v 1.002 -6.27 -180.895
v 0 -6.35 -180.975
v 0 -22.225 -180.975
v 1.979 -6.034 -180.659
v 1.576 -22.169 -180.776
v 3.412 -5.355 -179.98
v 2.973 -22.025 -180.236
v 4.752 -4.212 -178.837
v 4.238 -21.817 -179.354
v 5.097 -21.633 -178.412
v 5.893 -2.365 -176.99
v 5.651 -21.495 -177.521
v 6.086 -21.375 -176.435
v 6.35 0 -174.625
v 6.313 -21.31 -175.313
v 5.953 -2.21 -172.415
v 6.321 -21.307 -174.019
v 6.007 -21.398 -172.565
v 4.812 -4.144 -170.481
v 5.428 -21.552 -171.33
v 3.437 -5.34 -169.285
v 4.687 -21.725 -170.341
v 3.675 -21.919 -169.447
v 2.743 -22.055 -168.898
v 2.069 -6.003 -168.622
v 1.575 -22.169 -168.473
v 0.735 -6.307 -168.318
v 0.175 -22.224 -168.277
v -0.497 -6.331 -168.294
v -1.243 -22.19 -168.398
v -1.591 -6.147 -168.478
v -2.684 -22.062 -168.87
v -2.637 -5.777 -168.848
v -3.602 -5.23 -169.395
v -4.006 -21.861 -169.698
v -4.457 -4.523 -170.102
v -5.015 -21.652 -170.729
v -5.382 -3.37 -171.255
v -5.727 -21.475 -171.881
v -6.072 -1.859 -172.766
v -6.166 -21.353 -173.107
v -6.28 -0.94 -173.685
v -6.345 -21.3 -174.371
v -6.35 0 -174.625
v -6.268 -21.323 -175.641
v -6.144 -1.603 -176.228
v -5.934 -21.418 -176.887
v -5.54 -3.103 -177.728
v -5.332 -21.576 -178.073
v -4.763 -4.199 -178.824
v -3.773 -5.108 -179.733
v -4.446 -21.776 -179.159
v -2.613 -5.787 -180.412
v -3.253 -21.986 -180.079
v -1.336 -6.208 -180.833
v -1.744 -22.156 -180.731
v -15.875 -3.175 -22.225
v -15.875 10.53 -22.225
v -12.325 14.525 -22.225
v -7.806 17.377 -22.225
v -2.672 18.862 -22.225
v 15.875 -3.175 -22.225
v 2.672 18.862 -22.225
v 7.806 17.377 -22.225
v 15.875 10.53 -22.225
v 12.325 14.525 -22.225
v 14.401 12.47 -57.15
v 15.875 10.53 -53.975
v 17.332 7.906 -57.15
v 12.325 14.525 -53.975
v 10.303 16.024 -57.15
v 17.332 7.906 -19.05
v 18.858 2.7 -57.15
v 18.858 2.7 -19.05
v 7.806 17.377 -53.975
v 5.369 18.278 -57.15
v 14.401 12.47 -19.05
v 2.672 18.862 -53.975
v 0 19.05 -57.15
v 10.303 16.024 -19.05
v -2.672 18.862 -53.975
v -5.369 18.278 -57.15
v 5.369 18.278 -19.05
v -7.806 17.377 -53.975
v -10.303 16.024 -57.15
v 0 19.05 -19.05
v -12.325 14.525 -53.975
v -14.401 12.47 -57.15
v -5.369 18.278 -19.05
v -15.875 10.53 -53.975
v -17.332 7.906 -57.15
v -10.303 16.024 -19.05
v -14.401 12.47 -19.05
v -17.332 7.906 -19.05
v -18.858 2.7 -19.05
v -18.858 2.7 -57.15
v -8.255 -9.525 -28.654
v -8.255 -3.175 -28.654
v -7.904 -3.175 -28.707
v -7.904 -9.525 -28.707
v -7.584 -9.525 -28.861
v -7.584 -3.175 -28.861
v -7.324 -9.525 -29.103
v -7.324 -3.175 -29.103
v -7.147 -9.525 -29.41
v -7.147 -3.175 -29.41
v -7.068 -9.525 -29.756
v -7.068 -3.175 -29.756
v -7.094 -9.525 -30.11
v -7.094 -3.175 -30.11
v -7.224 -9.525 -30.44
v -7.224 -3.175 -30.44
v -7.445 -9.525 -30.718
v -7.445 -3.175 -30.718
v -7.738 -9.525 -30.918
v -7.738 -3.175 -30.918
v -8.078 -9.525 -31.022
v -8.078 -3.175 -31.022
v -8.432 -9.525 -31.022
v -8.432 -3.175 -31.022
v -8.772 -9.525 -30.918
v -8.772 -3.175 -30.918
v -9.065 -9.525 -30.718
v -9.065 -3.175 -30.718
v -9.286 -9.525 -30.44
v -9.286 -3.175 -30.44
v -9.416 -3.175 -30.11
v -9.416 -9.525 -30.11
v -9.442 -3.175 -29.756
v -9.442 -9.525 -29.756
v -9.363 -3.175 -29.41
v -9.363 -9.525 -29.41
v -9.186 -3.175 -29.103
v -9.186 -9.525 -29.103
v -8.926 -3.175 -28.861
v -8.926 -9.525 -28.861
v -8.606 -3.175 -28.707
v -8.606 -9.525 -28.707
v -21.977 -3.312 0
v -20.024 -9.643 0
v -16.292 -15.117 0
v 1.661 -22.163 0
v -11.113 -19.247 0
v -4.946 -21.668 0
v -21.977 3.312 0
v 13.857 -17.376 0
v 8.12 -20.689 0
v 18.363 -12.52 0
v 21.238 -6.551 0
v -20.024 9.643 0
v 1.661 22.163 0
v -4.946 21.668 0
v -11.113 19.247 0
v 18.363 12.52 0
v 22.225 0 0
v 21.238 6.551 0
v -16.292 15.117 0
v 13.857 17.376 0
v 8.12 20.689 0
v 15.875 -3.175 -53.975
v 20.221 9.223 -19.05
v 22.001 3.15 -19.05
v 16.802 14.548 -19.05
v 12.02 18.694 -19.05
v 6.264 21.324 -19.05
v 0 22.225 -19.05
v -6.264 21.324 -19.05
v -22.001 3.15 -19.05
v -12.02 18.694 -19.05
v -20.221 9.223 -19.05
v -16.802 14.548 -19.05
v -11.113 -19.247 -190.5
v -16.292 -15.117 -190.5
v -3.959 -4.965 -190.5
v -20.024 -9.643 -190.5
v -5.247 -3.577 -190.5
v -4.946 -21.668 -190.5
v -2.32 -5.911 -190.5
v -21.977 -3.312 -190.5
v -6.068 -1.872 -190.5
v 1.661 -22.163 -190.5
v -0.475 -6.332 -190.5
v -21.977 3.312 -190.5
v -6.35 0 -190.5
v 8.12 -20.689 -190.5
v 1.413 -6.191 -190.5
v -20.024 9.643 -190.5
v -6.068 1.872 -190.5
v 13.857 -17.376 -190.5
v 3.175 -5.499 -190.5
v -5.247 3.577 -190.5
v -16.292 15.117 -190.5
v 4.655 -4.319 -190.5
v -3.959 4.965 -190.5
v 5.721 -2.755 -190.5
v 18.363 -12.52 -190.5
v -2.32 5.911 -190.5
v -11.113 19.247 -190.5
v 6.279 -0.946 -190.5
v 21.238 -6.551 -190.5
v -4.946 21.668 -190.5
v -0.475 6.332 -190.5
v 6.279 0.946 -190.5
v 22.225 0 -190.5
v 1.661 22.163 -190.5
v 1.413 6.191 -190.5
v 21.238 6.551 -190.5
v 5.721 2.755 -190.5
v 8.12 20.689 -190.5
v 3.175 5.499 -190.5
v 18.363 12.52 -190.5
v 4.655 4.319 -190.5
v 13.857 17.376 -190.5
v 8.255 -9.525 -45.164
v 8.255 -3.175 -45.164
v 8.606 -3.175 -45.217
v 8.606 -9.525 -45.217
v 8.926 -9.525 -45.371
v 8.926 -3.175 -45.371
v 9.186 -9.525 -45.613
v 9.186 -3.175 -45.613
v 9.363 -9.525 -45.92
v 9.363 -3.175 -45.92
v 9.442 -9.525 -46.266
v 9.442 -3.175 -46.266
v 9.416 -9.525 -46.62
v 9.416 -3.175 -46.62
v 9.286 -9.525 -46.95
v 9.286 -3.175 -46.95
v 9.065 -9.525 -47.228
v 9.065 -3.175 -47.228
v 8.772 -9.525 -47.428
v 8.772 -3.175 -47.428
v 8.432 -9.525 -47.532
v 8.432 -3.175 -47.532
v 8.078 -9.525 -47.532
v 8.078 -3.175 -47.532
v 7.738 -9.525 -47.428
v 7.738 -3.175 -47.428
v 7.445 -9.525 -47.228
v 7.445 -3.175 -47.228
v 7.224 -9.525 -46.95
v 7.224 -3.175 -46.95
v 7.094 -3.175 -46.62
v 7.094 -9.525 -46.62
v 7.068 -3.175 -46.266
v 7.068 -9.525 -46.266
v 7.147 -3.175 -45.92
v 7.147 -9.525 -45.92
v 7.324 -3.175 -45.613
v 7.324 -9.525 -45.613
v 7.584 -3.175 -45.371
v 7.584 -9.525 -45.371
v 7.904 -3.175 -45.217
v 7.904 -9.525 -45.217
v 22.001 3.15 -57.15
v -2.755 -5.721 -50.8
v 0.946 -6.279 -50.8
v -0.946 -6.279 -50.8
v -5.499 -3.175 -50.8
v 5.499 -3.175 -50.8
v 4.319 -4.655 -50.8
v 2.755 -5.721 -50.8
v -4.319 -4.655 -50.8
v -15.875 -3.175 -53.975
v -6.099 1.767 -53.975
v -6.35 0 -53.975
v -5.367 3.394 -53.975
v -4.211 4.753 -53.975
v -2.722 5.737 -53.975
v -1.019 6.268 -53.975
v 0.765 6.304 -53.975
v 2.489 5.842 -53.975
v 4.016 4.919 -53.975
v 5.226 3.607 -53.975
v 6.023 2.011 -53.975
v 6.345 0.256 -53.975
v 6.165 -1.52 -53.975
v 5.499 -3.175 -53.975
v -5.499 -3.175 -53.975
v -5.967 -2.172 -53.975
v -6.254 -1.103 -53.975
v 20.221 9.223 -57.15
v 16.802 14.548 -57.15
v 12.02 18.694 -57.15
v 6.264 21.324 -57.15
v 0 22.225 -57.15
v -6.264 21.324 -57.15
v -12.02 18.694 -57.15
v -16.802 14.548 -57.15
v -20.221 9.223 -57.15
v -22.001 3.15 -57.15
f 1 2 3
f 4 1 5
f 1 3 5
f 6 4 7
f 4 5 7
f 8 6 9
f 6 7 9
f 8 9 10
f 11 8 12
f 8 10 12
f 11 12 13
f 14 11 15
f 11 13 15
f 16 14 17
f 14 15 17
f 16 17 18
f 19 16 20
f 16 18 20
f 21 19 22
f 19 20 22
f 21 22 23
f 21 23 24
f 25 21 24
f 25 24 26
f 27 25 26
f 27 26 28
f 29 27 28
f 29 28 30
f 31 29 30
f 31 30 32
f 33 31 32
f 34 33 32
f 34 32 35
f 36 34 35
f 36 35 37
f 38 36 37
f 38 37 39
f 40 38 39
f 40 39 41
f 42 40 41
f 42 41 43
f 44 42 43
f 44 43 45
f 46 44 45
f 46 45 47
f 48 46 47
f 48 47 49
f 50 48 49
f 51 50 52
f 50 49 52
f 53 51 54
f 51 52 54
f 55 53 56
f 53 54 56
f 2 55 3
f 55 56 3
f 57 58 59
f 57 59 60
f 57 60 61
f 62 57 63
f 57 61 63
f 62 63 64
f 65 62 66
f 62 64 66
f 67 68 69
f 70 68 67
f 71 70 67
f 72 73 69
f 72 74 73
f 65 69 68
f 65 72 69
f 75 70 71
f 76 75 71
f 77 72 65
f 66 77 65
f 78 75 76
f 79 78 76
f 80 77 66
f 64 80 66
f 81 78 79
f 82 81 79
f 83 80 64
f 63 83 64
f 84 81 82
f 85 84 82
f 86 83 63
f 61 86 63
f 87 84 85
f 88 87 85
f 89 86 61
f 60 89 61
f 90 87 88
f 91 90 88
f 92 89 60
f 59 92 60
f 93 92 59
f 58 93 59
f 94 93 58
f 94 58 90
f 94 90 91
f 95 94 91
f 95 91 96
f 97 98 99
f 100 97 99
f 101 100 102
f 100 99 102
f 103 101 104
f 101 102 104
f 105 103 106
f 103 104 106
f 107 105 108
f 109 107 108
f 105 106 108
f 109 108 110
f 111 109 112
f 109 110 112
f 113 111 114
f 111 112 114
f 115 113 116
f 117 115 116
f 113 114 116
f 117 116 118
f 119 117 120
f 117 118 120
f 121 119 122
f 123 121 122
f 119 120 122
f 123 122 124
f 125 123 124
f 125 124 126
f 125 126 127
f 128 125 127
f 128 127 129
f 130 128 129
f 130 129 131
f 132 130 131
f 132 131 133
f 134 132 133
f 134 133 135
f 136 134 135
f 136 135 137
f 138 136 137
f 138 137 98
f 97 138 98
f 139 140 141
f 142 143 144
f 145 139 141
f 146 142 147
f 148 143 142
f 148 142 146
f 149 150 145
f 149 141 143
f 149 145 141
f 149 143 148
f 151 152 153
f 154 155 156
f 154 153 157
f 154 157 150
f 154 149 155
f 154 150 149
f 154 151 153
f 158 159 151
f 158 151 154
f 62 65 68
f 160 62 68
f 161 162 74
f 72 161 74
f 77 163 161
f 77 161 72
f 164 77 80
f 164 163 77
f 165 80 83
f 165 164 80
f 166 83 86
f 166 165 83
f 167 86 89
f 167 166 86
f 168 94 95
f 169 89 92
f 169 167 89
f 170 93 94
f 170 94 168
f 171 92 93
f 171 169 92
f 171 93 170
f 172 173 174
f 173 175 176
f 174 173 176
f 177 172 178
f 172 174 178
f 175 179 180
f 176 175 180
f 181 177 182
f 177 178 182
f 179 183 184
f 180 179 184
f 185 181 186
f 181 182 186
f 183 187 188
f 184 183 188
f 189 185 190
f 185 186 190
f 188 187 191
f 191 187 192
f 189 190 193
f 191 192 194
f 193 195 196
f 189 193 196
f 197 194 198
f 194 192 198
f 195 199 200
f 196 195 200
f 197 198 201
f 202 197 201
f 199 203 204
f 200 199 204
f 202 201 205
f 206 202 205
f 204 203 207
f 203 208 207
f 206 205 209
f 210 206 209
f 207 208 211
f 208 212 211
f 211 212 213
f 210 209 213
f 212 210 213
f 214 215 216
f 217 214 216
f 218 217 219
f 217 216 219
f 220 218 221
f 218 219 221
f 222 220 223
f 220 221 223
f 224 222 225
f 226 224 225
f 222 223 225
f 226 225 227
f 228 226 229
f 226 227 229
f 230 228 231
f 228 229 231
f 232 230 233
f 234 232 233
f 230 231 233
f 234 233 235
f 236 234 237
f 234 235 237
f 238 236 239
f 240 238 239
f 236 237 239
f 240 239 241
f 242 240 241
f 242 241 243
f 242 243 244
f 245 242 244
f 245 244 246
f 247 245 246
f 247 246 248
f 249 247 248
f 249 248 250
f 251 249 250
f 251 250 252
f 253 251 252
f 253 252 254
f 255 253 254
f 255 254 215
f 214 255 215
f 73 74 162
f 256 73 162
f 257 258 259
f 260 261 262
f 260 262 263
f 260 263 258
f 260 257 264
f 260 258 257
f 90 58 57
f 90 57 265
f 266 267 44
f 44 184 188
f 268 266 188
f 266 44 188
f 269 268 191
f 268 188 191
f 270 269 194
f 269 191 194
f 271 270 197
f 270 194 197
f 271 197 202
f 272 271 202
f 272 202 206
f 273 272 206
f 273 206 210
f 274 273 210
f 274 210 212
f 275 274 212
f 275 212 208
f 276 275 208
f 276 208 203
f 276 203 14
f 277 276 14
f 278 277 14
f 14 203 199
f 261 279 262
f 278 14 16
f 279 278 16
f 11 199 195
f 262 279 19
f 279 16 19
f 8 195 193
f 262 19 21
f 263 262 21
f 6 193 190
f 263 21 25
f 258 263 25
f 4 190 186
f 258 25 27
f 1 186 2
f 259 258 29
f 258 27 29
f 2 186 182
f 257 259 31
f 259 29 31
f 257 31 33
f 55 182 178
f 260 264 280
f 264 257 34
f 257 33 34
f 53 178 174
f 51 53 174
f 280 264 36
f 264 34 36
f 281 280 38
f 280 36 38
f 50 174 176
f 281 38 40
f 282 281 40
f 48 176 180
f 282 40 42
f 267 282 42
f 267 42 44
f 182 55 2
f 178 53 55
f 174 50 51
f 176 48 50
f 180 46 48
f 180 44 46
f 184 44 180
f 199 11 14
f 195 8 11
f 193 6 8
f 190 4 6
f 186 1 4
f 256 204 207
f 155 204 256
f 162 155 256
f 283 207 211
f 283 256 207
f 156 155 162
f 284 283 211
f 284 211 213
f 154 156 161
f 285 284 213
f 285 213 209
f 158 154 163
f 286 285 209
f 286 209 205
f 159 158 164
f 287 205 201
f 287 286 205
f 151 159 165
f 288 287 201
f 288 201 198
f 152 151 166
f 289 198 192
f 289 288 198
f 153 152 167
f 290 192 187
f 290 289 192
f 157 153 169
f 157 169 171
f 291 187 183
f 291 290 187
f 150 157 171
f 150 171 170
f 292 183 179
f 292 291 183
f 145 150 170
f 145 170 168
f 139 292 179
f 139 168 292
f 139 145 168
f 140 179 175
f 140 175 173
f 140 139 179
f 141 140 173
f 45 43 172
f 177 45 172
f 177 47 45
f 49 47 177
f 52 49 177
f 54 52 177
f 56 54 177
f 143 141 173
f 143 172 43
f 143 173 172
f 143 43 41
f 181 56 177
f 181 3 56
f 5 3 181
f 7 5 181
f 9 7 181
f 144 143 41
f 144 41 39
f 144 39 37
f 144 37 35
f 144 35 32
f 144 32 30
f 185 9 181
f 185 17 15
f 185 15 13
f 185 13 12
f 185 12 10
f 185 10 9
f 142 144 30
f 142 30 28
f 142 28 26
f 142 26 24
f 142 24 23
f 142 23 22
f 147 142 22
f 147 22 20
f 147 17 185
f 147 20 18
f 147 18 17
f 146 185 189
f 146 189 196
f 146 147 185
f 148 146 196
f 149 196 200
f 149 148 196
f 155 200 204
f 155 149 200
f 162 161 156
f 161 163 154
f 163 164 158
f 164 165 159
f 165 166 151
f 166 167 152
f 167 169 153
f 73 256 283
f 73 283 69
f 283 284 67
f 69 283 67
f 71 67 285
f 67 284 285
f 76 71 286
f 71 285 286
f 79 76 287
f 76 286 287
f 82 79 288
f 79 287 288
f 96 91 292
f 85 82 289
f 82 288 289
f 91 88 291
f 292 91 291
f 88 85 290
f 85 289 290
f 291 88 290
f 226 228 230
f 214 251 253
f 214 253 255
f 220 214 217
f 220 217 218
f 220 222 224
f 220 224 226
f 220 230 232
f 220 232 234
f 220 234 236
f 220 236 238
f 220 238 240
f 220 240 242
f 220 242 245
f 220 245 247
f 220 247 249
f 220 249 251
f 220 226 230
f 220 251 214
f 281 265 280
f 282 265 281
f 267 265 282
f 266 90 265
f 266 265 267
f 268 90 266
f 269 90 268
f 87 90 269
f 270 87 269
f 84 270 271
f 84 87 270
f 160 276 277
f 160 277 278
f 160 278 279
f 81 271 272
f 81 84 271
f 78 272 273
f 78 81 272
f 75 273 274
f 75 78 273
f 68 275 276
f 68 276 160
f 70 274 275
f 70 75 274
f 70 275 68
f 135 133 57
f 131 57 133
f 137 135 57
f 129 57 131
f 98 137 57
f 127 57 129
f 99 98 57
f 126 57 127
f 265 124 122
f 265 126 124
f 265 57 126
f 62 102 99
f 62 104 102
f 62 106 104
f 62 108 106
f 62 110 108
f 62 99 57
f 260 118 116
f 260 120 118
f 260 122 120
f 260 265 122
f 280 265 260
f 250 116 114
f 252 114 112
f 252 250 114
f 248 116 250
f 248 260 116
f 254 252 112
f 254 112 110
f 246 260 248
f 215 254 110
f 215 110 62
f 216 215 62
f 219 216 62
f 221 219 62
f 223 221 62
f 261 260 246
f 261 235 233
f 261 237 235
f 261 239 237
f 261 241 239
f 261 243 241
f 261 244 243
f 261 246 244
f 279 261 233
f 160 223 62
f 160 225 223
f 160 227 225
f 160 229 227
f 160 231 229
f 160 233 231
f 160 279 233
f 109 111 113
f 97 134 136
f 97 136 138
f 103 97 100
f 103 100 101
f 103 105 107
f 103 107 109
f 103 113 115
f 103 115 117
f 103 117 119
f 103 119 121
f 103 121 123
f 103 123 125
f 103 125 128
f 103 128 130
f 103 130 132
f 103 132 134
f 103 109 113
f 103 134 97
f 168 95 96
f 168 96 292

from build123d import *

# Parameters (mm, degrees)
SKETCH2_R           = 22.225
BOSS_EXTRUDE1_DEPTH = 190.5
SKETCH3_R           = 6.35
CUT_EXTRUDE1_DEPTH  = 139.7
WRAP1_SECTION_W     = 3.175
WRAP1_SECTION_H     = 38.1
WRAP1_ANGLE         = 163.70222718
SKETCH6_W           = 31.75
SKETCH6_H           = 31.75
CUT_EXTRUDE2_DEPTH  = 25.4
SKETCH7_R           = 1.190625
CUT_EXTRUDE3_DEPTH  = 31.75
SKETCH8_R           = 6.35
CUT_EXTRUDE4_DEPTH  = 22.225


with BuildPart() as part:
    # Sketch2 → Boss-Extrude1 (new body)
    with BuildSketch(Plane.XY):
        Circle(SKETCH2_R)
    extrude(amount=-BOSS_EXTRUDE1_DEPTH)

    # Sketch3 → Cut-Extrude1 (cut)
    with BuildSketch(Plane(origin=(0, 0, -190.5), x_dir=(-1, 0, 0), z_dir=(0, 0, -1))):
        Circle(SKETCH3_R)
    extrude(amount=-CUT_EXTRUDE1_DEPTH, mode=Mode.SUBTRACT)

    # Wrap1 section (on wrap section) → Wrap1 (revolve, cut)
    with BuildSketch(Plane(origin=(0, 0, 0), x_dir=(0.9899030763721239, 0.14174589725634046, 0), z_dir=(0.14174589725634046, -0.9899030763721239, 0))):
        with Locations((20.6375, -38.1)):
            Rectangle(WRAP1_SECTION_W, WRAP1_SECTION_H)
    revolve(axis=Axis((0, 0, 0), (0, 0, 1)), revolution_arc=WRAP1_ANGLE, mode=Mode.SUBTRACT)

    # Sketch6 → Cut-Extrude2 (cut)
    with BuildSketch(Plane(origin=(0, 22.225, 0), x_dir=(1, 0, 0), z_dir=(0, 1, 0))):
        with Locations((0, 38.1)):
            Rectangle(SKETCH6_W, SKETCH6_H)
    extrude(amount=-CUT_EXTRUDE2_DEPTH, mode=Mode.SUBTRACT)

    # Sketch7 → Cut-Extrude3 (cut)
    with BuildSketch(Plane(origin=(0, 22.225, 0), x_dir=(1, 0, 0), z_dir=(0, 1, 0))):
        with Locations(Location((-8.255, 29.845, 0), (0, 0, 270))):
            Circle(SKETCH7_R)
        with Locations(Location((8.255, 46.355, 0), (0, 0, 270))):
            Circle(SKETCH7_R)
    extrude(amount=-CUT_EXTRUDE3_DEPTH, mode=Mode.SUBTRACT)

    # Sketch8 → Cut-Extrude4 (cut)
    with BuildSketch(Plane(origin=(0, -22.225, 0), x_dir=(-1, 0, 0), z_dir=(0, -1, 0))):
        with Locations(Location((0, 174.625, 0), (0, 0, 90))):
            Circle(SKETCH8_R)
    extrude(amount=-CUT_EXTRUDE4_DEPTH, mode=Mode.SUBTRACT)


solid = part.part
